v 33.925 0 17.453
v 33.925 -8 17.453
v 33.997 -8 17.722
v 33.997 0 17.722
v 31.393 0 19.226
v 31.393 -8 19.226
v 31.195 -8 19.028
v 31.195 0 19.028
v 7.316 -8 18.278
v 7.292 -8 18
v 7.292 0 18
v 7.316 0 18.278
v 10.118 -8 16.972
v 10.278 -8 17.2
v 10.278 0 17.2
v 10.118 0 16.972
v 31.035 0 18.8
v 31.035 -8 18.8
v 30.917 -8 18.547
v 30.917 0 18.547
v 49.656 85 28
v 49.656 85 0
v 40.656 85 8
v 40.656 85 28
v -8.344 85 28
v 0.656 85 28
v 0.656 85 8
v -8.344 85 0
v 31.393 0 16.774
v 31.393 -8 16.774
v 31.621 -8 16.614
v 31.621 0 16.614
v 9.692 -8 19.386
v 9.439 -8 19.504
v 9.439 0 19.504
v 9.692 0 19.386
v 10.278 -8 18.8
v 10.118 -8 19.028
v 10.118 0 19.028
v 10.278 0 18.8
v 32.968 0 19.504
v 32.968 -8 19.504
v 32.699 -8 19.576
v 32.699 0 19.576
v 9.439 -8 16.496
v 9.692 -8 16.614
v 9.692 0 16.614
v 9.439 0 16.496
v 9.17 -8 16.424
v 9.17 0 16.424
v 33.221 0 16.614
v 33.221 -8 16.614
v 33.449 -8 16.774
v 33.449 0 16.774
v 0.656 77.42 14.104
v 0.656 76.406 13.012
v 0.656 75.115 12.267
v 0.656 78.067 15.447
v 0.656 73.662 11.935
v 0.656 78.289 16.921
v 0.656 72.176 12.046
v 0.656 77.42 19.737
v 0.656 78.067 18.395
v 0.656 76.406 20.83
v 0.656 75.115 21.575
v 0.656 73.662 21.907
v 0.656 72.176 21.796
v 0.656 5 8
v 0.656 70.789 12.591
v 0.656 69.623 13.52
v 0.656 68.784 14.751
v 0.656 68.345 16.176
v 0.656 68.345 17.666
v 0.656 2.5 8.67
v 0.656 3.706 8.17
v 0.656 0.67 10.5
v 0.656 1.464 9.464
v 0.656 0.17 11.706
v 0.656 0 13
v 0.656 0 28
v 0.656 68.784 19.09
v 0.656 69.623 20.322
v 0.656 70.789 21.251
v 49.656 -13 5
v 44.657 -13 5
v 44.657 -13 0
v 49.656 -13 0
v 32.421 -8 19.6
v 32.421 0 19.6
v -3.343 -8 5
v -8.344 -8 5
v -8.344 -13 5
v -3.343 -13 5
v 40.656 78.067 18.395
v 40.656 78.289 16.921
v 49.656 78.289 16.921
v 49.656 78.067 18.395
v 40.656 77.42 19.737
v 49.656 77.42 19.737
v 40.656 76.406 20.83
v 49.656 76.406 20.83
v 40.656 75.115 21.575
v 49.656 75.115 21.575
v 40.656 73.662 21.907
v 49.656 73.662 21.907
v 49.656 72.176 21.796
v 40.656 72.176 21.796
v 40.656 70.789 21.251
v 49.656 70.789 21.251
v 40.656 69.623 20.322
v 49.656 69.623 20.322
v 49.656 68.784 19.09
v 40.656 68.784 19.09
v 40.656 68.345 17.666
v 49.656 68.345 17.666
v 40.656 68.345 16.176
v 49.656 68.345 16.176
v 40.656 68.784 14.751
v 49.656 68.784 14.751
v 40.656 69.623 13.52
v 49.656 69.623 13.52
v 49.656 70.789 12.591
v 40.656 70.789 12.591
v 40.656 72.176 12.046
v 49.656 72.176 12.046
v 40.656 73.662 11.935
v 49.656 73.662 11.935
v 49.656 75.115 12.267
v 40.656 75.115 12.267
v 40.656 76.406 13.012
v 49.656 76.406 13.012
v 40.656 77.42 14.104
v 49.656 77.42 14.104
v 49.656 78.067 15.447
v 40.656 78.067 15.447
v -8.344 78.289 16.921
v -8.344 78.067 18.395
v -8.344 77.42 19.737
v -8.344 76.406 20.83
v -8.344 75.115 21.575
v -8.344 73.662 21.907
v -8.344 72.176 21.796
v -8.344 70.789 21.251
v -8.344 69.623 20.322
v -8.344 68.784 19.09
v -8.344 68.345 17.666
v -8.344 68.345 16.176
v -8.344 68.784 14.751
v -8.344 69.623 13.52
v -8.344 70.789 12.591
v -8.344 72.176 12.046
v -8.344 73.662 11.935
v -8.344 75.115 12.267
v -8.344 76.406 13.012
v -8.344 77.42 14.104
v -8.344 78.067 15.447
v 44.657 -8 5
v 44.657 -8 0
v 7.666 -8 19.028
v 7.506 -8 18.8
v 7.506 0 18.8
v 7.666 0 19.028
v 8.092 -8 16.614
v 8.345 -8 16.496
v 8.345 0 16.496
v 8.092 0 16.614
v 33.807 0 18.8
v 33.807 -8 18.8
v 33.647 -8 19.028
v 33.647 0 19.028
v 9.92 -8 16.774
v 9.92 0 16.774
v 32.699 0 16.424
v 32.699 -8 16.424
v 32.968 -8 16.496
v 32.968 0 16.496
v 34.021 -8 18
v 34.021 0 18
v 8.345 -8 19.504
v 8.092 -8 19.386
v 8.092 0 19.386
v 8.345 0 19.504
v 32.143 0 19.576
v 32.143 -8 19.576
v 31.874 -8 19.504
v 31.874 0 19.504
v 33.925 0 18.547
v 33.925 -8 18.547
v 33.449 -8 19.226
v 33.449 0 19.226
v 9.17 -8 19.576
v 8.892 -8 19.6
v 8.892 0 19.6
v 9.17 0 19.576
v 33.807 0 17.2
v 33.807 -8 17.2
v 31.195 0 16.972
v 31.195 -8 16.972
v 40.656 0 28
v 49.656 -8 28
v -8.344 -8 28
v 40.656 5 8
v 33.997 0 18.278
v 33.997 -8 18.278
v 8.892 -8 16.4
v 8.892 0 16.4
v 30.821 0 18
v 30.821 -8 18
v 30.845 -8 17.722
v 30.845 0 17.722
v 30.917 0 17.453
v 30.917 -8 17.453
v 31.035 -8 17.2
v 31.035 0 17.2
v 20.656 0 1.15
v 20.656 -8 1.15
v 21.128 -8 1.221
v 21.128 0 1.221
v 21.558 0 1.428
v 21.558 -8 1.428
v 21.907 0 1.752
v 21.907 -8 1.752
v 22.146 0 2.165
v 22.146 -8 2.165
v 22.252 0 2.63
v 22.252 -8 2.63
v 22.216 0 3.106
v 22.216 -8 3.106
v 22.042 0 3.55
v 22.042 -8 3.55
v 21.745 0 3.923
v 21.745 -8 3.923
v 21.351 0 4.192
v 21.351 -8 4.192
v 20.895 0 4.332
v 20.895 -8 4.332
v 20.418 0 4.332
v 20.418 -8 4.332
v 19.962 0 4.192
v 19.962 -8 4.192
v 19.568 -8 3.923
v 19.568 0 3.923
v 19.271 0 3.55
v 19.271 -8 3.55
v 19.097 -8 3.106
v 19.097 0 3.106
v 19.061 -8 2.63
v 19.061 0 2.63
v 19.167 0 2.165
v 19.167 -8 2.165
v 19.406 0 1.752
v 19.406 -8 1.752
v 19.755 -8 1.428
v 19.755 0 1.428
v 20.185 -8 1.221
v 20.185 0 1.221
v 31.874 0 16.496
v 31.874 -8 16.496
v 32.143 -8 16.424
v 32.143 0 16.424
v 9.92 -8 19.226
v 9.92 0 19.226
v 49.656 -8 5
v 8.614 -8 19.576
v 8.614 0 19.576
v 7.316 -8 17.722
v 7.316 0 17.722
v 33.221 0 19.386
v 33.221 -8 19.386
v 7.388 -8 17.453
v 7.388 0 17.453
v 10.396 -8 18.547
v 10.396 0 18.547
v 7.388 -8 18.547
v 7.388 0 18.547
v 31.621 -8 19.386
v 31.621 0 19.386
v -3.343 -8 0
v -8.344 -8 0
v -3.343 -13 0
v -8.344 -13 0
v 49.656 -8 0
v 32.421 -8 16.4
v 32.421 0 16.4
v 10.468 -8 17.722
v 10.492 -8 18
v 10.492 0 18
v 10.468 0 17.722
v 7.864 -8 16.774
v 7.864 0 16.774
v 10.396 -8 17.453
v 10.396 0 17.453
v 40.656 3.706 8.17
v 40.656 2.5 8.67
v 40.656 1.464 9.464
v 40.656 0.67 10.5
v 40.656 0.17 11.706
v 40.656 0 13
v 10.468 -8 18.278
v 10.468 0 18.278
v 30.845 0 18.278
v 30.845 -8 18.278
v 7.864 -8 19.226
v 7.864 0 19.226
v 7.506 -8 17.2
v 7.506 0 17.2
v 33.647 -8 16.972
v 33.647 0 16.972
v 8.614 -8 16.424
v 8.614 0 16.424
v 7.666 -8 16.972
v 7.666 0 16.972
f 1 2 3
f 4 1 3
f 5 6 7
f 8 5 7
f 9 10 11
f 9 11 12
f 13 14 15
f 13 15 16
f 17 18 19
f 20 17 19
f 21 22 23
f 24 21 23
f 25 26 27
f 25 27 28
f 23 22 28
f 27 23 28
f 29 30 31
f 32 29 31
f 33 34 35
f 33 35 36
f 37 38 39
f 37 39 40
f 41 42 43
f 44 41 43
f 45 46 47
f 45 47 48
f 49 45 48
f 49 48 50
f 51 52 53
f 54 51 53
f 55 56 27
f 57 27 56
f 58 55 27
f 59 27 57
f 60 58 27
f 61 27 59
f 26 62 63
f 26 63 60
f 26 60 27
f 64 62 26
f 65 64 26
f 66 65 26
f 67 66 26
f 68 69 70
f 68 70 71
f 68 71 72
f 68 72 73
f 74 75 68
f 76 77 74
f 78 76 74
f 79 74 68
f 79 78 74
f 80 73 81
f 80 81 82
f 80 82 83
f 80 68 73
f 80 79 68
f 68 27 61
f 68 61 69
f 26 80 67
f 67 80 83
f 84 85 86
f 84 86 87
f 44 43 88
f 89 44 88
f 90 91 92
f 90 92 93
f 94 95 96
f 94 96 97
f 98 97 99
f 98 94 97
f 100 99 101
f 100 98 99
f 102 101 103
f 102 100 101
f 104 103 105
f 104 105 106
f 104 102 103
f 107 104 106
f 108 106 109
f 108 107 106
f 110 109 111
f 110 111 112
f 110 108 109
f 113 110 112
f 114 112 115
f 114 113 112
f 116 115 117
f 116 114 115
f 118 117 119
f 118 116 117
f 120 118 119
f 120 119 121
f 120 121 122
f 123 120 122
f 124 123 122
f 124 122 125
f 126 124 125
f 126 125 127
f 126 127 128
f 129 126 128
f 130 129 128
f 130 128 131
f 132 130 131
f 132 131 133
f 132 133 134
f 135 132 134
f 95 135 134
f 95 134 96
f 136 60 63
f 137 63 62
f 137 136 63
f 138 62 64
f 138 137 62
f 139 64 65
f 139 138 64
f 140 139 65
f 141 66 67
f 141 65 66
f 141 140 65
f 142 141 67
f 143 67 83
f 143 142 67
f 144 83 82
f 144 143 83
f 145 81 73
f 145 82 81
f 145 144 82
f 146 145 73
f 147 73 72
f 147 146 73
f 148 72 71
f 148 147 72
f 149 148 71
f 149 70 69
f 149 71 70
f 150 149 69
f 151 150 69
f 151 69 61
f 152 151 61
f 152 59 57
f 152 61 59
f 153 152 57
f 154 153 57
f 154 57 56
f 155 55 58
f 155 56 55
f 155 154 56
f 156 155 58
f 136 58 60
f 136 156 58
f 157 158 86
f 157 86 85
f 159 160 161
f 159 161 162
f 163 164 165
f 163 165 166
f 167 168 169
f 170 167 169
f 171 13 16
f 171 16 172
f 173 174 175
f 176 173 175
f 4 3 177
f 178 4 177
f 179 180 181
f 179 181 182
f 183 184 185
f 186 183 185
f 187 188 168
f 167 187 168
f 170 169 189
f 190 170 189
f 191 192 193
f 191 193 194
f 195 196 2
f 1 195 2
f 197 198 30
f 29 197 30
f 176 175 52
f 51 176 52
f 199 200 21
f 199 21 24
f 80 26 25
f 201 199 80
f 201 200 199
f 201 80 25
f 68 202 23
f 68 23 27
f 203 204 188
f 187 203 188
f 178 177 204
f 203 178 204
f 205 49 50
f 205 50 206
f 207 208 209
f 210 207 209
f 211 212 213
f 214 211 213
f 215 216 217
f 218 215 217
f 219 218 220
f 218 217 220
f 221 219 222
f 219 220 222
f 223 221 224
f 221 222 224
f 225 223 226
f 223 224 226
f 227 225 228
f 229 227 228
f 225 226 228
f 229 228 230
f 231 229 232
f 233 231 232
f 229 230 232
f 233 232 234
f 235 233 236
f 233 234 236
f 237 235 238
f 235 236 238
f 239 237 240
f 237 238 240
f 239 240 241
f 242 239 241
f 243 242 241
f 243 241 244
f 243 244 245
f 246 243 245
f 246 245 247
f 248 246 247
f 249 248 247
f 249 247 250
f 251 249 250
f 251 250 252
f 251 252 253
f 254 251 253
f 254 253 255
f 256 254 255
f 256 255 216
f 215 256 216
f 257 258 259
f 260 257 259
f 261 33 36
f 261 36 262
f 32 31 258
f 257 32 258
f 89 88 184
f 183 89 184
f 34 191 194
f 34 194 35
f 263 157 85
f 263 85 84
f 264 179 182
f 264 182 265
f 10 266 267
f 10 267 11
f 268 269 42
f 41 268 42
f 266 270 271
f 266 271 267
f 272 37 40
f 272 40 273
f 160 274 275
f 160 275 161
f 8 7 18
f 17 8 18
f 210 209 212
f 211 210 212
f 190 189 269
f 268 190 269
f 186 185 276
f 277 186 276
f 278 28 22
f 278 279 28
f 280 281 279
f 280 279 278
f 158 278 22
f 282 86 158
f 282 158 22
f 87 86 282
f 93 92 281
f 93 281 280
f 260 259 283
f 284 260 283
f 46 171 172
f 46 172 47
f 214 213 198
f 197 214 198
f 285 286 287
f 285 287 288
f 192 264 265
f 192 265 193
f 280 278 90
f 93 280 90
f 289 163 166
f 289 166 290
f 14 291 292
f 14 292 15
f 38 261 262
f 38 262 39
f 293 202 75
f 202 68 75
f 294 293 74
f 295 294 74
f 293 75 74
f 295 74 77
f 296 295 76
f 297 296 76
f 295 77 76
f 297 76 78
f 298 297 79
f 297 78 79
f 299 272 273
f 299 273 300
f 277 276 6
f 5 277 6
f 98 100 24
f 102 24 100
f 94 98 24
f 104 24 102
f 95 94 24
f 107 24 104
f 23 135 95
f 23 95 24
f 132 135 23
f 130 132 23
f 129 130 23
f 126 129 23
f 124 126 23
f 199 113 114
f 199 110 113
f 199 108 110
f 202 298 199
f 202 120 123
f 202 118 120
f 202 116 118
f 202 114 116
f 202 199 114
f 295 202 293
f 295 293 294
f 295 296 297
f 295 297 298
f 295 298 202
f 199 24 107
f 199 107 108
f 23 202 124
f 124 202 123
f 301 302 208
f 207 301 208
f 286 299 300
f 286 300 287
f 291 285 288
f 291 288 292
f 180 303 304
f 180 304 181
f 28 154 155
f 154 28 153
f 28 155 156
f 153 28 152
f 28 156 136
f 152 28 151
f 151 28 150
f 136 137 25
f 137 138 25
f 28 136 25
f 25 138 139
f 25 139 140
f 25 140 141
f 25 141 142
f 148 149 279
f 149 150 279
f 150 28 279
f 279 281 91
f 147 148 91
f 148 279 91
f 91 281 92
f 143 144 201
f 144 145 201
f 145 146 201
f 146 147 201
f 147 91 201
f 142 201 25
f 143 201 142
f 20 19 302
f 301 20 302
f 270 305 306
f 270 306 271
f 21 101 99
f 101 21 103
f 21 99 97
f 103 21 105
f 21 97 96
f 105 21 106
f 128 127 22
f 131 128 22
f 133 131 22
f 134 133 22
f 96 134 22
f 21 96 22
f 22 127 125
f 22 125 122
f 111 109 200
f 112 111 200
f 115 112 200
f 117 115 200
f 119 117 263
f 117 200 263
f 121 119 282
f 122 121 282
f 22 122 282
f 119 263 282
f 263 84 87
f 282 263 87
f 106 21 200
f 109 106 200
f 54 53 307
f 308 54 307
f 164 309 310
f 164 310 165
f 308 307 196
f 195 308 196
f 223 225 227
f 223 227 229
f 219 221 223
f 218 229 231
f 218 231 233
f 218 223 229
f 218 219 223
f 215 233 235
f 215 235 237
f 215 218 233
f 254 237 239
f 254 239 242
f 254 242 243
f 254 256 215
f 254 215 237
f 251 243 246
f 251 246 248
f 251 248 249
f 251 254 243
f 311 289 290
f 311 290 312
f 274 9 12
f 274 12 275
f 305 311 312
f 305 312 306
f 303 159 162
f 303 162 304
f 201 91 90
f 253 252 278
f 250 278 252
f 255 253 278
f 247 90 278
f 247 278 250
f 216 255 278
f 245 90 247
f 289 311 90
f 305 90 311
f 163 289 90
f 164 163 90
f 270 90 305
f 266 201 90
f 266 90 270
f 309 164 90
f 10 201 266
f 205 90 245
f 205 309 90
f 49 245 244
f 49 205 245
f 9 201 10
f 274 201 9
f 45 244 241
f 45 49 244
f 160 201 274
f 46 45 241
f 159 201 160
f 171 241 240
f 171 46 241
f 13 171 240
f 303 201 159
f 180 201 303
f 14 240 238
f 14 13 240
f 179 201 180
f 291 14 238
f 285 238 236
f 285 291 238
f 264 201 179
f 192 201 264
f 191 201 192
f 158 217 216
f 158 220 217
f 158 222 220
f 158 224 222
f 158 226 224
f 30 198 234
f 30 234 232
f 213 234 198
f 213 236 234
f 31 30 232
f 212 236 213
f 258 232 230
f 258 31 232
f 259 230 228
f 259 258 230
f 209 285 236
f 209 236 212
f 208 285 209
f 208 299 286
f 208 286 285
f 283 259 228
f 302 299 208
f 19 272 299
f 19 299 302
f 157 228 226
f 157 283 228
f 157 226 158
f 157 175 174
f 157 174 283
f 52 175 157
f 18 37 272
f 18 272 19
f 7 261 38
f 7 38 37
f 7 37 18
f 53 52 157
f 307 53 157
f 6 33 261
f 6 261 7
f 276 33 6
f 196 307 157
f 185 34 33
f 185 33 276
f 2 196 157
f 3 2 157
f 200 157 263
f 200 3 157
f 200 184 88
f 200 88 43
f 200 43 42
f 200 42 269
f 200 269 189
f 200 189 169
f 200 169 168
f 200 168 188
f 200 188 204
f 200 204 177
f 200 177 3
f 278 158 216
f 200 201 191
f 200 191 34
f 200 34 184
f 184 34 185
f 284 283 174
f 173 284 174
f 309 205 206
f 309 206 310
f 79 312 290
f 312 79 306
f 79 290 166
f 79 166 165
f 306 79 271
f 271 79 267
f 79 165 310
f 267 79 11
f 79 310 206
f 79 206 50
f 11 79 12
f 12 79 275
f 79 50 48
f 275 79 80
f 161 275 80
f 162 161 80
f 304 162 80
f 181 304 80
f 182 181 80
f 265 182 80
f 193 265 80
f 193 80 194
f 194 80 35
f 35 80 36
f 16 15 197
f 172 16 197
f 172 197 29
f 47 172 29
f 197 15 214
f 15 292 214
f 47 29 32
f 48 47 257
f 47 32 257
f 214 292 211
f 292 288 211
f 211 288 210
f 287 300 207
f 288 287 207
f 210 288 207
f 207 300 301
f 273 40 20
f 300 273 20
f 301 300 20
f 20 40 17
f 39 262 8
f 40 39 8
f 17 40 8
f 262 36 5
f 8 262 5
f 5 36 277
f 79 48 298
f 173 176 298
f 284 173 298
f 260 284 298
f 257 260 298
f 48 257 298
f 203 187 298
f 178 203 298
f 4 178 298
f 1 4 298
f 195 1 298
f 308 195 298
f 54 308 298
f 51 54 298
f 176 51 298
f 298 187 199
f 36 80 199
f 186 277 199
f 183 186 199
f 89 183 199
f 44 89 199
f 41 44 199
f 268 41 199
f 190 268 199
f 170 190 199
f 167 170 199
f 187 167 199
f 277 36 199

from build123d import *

# Parameters (mm, degrees)
SKETCH1_W           = 57.999999262
SKETCH1_H           = 28.000000864
BOSS_EXTRUDE1_DEPTH = 8
CUT_EXTRUDE10_REACH = 59.565
SKETCH11_R          = 1.6
CUT_EXTRUDE11_DEPTH = 58.565336436
CUT_EXTRUDE12_DEPTH = 58.565336436
SKETCH15_W          = 5.000000121
SKETCH15_H          = 4.999999888
BOSS_EXTRUDE2_DEPTH = 4.999998957
SKETCH16_W          = 4.999998957
SKETCH16_H          = 4.999999888
BOSS_EXTRUDE3_DEPTH = 4.999998957
BOSS_EXTRUDE4_DEPTH = 85
HOLE2_START         = -8.343500085
HOLE2_OUTLINE_R     = 5
HOLE2_DEPTH         = 57.999999262
FILLET1_R           = 5


# Read off the part's stored shape, not the designer's step: Hole2
with BuildPart() as part:
    # Sketch1 → Boss-Extrude1 (new body)
    with BuildSketch(Plane.XZ):
        with Locations((20.656499546, 14.000000432)):
            Rectangle(SKETCH1_W, SKETCH1_H)
    extrude(amount=BOSS_EXTRUDE1_DEPTH)

    # Sketch11 → Cut-Extrude10 (cut, up to next)
    with BuildSketch(Plane.XZ.offset(8), mode=Mode.PRIVATE) as cut_extrude10_sk1:
        with Locations(Location((20.656499132, 2.749998098, 0), (0, 0, 270))):
            Circle(SKETCH11_R)
    cut_extrude10_tool1 = extrude(cut_extrude10_sk1.sketch, amount=-CUT_EXTRUDE10_REACH, mode=Mode.PRIVATE) & part.part
    add(cut_extrude10_tool1.solids().sort_by_distance((20.656499, -8, 2.749998))[0], mode=Mode.SUBTRACT)

    # Sketch12 → Cut-Extrude11 (cut, through all)
    with BuildSketch(Plane(origin=(0, -8, 0), x_dir=(-1, 0, 0), z_dir=(0, 1, 0))):
        Polygon((-7.388492115, 18.547229469), (-7.506358903, 18.799999729), (-7.666328922, 19.028460607), (-7.863540202, 19.225670025), (-8.092000149, 19.385639578), (-8.344767615, 19.503509626), (-8.614162914, 19.575690851), (-8.891999722, 19.600000232), (-9.16983746, 19.575690851), (-9.439231828, 19.503509626), (-9.692000225, 19.385639578), (-9.920460172, 19.225670025), (-10.11766959, 19.028460607), (-10.277640074, 18.799999729), (-10.395510122, 18.547229469), (-10.467690416, 18.277840689), (-10.491999798, 17.999999225), (-10.467690416, 17.722159624), (-10.395510122, 17.452770844), (-10.277640074, 17.200000584), (-10.11766959, 16.971539706), (-9.920460172, 16.774330288), (-9.692000225, 16.614360735), (-9.439231828, 16.496490687), (-9.16983746, 16.424309462), (-8.891999722, 16.40000008), (-8.614162914, 16.424309462), (-8.344767615, 16.496490687), (-8.092000149, 16.614360735), (-7.863540202, 16.774330288), (-7.666328922, 16.971539706), (-7.506358903, 17.200000584), (-7.388492115, 17.452770844), (-7.316308096, 17.722159624), (-7.292000111, 17.999999225), (-7.316308096, 18.277840689), align=None)
    extrude(amount=CUT_EXTRUDE11_DEPTH, mode=Mode.SUBTRACT)

    # Sketch13 → Cut-Extrude12 (cut, through all)
    with BuildSketch(Plane.XZ.offset(8)):
        Polygon((32.698839903, 16.424309462), (32.968230546, 16.496490687), (33.220998943, 16.614360735), (33.449459821, 16.774330288), (33.646669239, 16.971539706), (33.806640655, 17.200000584), (33.92450884, 17.452770844), (33.996690065, 17.722159624), (34.021001309, 17.999999225), (33.996690065, 18.277840689), (33.92450884, 18.547229469), (33.806640655, 18.799999729), (33.646669239, 19.028460607), (33.449459821, 19.225670025), (33.220998943, 19.385639578), (32.968230546, 19.503509626), (32.698839903, 19.575690851), (32.421000302, 19.600000232), (32.143160701, 19.575690851), (31.873770058, 19.503509626), (31.621001661, 19.385639578), (31.392540783, 19.225670025), (31.195329502, 19.028460607), (31.035359949, 18.799999729), (30.917489901, 18.547229469), (30.845310539, 18.277840689), (30.820999295, 17.999999225), (30.845310539, 17.722159624), (30.917489901, 17.452770844), (31.035359949, 17.200000584), (31.195329502, 16.971539706), (31.392540783, 16.774330288), (31.621001661, 16.614360735), (31.873770058, 16.496490687), (32.143160701, 16.424309462), (32.421000302, 16.40000008), align=None)
    extrude(amount=-CUT_EXTRUDE12_DEPTH, mode=Mode.SUBTRACT)

    # Sketch15 → Boss-Extrude2 (add)
    with BuildSketch(Plane.XZ.offset(8)):
        with Locations((-5.843500025, 2.499999944)):
            Rectangle(SKETCH15_W, SKETCH15_H)
    extrude(amount=BOSS_EXTRUDE2_DEPTH)

    # Sketch16 → Boss-Extrude3 (add)
    with BuildSketch(Plane.XZ.offset(8)):
        with Locations((47.156499698, 2.499999944)):
            Rectangle(SKETCH16_W, SKETCH16_H)
    extrude(amount=BOSS_EXTRUDE3_DEPTH)

    # Sketch17 → Boss-Extrude4 (add)
    with BuildSketch(Plane(origin=(0, 0, 0), x_dir=(1, 0, 0), z_dir=(0, 1, 0))):
        Polygon((-8.343500085, 0), (49.656499177, 0), (49.656499177, -8), (49.656499177, -28.000000864), (40.656499177, -28.000000864), (40.656499177, -8), (0.656499915, -8), (0.656499915, -28.000000864), (-8.343500085, -28.000000864), (-8.343500085, -8), align=None)
    extrude(amount=BOSS_EXTRUDE4_DEPTH)

    # Hole2 outline → Hole2 (cut)
    with BuildSketch(Plane.YZ.offset(HOLE2_START)):
        with Locations((73.288734932, 16.920895282)):
            Circle(HOLE2_OUTLINE_R)
    extrude(amount=HOLE2_DEPTH, mode=Mode.SUBTRACT)

    # Fillet1
    fillet1_edges = [part.edges().sort_by_distance(p)[0] for p in [
        (20.656499546, 0, 8),
    ]]
    fillet(fillet1_edges, radius=FILLET1_R)


solid = part.part
